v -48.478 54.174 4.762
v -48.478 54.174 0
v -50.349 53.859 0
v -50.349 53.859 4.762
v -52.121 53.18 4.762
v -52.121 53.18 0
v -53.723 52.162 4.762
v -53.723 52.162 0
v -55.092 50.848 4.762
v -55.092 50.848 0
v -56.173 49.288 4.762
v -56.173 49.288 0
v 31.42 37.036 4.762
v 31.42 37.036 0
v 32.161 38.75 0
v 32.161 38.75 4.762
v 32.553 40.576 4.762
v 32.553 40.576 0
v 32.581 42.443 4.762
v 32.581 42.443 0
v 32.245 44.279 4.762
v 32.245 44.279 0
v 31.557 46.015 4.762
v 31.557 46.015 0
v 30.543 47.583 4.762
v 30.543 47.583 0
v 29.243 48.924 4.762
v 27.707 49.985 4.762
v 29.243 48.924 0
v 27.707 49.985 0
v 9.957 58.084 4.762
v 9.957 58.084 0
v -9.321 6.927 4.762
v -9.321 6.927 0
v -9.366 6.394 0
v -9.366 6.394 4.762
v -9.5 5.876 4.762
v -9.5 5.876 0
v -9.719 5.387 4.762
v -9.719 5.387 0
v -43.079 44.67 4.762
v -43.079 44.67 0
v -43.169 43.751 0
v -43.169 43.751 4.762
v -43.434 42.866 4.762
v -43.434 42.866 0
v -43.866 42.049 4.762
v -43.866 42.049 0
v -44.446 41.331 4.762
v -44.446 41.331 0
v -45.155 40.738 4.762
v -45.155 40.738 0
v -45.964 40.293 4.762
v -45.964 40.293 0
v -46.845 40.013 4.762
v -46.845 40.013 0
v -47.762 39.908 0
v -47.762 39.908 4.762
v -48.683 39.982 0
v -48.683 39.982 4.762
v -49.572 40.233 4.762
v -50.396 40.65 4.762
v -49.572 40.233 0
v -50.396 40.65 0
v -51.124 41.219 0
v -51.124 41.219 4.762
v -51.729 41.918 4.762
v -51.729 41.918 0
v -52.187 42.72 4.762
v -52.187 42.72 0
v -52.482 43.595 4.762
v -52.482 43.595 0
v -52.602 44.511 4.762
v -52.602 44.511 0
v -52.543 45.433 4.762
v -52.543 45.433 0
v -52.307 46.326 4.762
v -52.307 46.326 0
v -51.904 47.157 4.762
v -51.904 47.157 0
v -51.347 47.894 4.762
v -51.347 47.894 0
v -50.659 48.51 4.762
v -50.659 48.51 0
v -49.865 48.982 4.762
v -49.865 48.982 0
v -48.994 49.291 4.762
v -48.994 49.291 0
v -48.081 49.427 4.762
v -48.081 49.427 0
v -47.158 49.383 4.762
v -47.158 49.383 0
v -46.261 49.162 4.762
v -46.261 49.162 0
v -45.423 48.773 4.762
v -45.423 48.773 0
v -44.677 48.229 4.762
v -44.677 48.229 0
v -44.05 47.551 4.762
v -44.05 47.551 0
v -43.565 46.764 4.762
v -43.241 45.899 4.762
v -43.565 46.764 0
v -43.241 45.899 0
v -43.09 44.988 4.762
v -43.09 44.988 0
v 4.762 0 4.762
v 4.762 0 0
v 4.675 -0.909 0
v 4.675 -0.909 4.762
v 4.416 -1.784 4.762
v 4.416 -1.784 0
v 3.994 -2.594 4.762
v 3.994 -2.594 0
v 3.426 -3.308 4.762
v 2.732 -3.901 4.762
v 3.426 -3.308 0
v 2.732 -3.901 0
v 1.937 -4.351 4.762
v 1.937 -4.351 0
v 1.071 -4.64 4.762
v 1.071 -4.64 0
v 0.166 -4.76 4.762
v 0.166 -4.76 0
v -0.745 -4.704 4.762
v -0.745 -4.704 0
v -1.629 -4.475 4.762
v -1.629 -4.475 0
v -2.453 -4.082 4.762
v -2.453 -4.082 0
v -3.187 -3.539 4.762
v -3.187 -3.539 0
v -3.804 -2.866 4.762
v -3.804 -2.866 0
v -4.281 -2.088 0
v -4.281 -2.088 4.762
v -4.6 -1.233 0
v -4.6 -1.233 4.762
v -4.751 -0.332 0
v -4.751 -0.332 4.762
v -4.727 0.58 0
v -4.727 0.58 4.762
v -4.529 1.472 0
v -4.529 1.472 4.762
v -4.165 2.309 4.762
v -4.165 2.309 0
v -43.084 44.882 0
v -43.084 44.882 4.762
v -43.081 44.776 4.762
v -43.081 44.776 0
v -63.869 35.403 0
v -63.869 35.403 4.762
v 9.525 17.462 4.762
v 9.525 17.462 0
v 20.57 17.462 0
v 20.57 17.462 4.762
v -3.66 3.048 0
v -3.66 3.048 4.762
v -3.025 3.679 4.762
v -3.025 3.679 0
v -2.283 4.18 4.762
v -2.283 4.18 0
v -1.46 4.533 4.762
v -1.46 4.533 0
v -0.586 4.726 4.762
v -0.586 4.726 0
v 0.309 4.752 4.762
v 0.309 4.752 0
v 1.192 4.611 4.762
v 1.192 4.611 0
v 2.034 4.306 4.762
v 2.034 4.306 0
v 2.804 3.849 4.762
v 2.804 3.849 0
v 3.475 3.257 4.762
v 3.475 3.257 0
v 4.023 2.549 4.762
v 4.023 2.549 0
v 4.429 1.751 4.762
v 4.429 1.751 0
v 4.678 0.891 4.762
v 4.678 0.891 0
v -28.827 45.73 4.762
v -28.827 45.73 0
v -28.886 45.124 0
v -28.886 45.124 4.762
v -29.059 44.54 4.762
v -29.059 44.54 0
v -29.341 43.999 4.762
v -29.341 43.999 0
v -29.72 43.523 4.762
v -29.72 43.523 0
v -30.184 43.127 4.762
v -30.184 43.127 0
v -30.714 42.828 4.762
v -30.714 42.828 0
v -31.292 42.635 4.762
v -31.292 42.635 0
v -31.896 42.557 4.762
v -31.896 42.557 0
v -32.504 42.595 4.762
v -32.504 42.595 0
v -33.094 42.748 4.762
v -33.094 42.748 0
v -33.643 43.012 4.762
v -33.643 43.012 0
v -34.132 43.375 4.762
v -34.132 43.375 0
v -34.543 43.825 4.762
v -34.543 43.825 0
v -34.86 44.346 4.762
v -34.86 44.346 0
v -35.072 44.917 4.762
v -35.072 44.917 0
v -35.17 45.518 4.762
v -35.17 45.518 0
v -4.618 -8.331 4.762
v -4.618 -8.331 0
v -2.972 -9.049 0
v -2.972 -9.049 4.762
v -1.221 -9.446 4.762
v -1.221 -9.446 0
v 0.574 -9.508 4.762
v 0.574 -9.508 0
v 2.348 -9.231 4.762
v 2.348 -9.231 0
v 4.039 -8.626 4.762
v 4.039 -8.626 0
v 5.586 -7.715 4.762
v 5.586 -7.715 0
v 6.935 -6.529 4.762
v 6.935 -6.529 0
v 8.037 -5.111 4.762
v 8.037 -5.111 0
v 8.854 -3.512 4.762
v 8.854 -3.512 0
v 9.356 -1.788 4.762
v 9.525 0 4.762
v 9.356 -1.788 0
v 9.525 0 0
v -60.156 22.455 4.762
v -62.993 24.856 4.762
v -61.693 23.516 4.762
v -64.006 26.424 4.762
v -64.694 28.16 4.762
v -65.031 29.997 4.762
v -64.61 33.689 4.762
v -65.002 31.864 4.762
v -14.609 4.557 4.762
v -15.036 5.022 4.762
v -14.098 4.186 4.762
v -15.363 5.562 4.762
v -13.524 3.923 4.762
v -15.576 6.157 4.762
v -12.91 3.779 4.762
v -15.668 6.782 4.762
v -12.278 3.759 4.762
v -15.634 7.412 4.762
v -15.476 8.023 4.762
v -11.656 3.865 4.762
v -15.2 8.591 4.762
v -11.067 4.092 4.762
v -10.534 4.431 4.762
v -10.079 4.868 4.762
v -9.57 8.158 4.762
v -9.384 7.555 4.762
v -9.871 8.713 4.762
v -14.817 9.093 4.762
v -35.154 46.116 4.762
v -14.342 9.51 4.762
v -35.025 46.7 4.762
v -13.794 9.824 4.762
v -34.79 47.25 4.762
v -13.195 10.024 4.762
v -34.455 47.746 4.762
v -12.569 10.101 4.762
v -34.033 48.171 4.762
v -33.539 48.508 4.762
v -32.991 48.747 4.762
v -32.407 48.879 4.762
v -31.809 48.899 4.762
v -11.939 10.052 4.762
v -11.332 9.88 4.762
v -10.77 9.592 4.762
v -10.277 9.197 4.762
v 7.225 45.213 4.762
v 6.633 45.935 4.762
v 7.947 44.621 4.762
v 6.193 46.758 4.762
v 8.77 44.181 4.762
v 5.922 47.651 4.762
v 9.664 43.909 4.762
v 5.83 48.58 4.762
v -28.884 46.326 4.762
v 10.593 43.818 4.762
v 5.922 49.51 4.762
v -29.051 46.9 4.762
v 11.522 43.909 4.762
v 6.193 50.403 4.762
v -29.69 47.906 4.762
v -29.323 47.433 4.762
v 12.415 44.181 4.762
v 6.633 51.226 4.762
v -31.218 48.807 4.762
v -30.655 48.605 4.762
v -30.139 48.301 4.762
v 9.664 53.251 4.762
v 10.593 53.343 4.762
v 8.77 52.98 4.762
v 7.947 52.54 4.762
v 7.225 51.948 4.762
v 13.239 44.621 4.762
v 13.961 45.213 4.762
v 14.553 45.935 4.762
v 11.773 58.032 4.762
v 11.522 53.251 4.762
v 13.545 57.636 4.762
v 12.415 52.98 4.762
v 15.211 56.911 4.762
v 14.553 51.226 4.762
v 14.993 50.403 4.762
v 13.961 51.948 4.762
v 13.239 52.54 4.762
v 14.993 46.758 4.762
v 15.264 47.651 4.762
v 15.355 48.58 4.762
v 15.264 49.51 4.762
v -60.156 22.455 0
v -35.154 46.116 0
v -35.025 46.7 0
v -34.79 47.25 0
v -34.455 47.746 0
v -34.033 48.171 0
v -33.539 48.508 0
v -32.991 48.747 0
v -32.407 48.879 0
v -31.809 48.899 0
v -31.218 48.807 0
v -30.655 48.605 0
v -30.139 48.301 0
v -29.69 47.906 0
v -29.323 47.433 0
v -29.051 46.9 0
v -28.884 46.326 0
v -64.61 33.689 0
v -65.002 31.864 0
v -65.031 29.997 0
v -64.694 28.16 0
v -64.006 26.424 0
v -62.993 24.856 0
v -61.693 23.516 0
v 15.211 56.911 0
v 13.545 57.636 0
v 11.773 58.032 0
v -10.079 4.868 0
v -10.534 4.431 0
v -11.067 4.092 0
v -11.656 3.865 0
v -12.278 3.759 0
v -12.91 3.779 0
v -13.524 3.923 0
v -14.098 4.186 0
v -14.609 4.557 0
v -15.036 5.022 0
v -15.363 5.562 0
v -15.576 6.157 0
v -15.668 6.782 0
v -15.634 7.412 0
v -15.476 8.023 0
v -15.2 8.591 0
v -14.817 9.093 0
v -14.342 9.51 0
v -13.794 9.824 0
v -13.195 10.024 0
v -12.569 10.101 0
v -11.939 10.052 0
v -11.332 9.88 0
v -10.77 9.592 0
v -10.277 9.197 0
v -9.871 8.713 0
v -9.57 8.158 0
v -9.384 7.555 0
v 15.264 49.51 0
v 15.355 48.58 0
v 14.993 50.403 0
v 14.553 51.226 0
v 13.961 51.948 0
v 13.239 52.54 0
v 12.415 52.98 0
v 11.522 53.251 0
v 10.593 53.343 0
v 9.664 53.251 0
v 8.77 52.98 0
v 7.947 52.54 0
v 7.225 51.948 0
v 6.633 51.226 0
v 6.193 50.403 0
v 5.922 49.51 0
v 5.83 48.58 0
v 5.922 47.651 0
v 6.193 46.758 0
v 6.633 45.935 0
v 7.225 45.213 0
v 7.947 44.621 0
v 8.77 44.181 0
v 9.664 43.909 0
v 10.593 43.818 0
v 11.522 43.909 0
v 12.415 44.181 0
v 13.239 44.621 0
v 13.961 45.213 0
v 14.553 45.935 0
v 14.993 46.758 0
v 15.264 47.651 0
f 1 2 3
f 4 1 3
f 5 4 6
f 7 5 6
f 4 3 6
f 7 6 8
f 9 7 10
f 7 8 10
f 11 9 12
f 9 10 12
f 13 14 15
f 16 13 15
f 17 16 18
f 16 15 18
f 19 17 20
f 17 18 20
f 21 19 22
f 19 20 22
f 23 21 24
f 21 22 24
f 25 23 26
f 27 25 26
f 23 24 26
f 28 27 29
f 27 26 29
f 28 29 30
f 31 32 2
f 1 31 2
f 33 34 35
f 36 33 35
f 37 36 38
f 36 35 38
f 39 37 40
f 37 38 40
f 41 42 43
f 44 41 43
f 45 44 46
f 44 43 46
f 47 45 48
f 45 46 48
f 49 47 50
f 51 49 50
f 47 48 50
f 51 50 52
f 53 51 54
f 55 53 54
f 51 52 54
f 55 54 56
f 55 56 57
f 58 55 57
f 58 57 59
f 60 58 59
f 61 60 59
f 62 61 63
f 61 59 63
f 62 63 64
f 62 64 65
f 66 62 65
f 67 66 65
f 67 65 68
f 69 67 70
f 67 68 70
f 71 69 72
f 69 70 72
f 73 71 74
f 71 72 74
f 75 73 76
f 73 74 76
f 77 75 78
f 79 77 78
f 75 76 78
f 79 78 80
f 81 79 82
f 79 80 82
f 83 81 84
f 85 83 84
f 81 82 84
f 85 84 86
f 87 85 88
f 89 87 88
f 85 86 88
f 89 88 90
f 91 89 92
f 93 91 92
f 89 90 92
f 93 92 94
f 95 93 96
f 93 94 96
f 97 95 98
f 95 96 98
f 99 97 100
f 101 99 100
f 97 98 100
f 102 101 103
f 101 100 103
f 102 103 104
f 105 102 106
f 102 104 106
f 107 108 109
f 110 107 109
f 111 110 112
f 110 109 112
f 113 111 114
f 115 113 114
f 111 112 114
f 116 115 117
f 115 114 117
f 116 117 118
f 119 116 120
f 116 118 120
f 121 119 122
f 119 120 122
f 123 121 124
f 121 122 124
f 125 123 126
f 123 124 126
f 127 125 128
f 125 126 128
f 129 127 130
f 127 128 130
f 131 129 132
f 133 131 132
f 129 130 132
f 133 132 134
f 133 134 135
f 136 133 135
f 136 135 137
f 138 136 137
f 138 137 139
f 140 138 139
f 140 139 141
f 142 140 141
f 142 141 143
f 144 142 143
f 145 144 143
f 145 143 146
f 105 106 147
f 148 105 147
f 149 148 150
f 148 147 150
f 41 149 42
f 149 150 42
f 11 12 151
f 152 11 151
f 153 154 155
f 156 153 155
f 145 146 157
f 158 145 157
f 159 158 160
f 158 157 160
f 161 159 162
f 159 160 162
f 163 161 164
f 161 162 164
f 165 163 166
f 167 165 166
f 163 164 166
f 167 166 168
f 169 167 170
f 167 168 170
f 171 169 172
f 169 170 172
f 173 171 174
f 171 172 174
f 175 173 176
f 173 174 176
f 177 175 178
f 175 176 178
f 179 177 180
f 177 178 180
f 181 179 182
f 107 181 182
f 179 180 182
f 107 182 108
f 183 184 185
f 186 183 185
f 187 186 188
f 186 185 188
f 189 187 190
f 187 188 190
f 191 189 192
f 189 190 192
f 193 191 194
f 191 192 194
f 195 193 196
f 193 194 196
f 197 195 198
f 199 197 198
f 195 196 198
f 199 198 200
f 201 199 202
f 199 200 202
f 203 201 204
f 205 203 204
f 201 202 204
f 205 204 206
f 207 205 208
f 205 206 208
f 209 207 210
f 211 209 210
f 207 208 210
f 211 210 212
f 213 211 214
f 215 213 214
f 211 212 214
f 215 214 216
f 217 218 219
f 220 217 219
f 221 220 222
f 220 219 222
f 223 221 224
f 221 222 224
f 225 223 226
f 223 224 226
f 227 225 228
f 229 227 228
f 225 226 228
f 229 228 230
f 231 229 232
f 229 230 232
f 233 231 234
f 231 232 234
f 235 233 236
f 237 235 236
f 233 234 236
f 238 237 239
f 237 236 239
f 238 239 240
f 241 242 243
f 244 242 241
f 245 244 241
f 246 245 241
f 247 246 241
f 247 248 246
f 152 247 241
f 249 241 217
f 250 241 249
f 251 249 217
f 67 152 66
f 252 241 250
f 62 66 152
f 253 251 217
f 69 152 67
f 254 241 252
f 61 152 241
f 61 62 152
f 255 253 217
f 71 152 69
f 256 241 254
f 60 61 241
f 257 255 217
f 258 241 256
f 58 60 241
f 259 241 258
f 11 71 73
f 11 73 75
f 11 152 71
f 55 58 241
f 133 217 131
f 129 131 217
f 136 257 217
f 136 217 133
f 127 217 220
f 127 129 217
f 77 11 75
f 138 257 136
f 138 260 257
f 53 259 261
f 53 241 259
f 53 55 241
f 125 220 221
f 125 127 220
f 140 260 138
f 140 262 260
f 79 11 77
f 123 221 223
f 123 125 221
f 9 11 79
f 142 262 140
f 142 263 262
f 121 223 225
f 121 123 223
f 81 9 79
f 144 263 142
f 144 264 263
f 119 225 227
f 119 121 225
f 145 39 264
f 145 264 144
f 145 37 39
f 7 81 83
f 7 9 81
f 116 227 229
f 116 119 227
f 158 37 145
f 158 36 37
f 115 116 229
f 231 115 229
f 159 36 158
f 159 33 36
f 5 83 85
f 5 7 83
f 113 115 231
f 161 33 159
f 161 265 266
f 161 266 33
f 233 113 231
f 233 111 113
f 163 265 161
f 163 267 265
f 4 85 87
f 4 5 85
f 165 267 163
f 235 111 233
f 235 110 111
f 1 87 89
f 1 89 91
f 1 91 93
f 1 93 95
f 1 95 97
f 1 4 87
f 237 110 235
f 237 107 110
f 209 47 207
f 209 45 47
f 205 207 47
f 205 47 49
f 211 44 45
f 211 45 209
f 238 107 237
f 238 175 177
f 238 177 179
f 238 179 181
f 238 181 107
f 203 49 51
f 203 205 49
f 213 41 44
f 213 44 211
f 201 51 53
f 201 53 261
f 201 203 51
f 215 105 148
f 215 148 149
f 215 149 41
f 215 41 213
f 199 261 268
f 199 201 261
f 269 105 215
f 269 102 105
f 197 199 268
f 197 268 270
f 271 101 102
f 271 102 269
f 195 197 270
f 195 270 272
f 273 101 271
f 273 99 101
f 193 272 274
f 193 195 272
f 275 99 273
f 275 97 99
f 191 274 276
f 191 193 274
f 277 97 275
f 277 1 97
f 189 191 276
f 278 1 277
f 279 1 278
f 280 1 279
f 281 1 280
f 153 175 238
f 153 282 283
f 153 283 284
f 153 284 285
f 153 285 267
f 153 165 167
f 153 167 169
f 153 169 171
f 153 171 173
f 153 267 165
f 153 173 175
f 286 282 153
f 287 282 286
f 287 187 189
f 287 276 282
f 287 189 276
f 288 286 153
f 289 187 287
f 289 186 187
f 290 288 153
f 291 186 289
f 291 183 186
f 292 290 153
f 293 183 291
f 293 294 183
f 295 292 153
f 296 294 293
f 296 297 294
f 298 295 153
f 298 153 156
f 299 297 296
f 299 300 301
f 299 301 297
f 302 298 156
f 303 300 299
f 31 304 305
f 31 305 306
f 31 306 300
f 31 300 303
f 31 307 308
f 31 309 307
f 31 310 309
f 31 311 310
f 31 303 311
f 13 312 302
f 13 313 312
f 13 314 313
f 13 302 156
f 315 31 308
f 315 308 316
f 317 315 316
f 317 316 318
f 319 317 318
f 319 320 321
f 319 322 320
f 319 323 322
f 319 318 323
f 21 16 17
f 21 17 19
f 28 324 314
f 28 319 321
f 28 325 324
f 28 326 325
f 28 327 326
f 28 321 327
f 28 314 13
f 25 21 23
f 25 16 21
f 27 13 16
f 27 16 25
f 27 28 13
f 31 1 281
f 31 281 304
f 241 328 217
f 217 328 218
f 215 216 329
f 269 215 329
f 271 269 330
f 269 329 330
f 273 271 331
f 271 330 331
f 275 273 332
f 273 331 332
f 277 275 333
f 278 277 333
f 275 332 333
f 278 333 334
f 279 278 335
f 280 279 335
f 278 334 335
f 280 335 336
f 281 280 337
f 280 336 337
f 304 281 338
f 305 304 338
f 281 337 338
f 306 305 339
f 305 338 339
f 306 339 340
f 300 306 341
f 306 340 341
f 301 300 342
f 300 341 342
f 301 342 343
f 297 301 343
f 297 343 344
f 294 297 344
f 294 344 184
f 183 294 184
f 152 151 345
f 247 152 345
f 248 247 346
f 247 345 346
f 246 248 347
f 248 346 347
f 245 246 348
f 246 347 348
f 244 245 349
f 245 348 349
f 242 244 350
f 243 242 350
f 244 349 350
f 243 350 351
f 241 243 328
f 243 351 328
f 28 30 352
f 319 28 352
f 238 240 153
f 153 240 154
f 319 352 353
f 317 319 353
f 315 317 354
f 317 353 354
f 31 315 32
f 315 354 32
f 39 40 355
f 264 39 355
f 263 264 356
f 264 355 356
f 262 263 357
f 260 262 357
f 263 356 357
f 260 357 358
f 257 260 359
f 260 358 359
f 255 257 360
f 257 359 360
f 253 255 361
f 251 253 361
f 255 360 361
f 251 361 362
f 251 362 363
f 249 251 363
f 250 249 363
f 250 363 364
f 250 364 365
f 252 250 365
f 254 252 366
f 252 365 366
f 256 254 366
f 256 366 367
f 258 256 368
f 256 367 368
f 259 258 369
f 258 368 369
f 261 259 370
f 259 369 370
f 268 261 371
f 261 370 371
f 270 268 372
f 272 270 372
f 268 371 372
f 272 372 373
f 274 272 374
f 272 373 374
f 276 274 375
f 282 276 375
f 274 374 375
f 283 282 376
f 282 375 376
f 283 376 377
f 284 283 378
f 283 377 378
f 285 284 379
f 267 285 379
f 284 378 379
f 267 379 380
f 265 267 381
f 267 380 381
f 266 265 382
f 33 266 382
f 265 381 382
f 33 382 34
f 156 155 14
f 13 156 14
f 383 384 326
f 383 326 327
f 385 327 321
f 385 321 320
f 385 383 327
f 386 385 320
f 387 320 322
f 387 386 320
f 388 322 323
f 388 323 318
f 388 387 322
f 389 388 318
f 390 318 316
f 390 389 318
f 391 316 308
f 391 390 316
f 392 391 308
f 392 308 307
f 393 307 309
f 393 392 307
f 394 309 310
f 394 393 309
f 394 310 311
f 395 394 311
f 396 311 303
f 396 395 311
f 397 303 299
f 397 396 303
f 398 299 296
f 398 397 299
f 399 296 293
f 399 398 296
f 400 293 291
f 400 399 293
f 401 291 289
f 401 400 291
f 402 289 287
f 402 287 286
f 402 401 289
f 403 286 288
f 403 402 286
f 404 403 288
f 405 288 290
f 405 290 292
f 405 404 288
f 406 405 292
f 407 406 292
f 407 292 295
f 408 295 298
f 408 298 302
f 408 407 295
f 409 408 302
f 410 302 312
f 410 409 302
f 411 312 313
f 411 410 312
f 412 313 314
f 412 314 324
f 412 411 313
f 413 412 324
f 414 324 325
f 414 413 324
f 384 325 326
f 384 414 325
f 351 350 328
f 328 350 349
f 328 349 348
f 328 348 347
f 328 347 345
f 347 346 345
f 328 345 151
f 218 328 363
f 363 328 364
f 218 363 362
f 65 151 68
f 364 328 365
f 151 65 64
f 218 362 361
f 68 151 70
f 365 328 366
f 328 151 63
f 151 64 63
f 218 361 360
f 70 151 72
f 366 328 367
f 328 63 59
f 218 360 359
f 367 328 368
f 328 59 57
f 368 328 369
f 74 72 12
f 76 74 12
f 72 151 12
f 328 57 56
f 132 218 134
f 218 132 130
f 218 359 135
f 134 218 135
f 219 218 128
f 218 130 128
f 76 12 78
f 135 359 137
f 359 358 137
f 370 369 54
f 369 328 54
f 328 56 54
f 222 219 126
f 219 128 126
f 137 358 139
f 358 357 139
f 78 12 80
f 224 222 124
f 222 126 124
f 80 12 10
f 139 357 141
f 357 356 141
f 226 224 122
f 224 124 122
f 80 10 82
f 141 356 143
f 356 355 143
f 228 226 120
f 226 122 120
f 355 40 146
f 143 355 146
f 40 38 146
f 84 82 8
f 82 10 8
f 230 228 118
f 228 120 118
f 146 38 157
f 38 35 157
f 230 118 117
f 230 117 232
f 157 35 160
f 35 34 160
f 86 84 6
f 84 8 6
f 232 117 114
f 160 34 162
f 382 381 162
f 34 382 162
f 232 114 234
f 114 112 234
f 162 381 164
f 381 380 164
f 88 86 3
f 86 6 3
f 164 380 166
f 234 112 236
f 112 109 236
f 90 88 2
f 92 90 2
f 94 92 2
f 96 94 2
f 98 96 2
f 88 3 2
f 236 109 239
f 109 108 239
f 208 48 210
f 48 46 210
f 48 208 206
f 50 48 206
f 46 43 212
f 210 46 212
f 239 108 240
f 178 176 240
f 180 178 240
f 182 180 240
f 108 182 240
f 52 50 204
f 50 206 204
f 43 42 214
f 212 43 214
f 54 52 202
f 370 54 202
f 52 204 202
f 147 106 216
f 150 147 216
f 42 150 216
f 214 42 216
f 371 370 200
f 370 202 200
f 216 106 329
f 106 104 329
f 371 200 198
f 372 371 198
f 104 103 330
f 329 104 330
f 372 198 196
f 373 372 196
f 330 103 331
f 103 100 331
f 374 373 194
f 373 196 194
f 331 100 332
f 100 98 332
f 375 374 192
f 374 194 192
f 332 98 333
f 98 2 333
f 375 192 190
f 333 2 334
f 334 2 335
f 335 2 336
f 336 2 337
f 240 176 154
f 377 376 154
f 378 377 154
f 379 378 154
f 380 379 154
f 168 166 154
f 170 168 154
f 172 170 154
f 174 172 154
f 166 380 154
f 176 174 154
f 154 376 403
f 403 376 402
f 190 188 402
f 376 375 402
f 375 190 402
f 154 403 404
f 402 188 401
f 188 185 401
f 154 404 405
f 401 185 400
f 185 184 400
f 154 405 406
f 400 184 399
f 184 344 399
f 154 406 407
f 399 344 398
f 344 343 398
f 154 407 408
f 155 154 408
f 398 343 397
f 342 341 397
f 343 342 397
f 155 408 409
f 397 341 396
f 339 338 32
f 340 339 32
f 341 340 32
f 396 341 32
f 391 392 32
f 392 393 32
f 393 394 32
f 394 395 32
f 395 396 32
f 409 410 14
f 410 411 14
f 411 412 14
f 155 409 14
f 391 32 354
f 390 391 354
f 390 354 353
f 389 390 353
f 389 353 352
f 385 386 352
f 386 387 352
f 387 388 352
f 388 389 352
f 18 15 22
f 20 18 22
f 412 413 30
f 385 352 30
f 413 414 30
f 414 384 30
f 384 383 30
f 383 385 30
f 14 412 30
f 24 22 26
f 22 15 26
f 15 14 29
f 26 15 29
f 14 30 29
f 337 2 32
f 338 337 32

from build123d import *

# Parameters (mm, degrees)
F0_R     = 4.7625
F1_DEPTH = 4.7625


# Not quite as in the source:
# - a length typed as a fraction of an inch, garbled in the dataset ("3 / 203.2 mm" for 3/8 in), is restored


with BuildPart() as f1:
    # F0 (on Top) → F1 (new body)
    with BuildSketch(Plane.XY):
        with BuildLine():
            Line((-60.1561630362, 22.4546581751), (-4.6178116328, -8.3307527105))
            ThreePointArc((-4.6178116328, -8.3307527105), (4.8343029072, -8.2070177532), (9.525, 0))
            Line((9.525, 0), (9.525, 17.4625))
            Line((9.525, 17.4625), (20.5700693075, 17.4625))
            Line((20.5700693075, 17.4625), (31.4198108747, 37.0359519197))
            ThreePointArc((31.4198108747, 37.0359519197), (32.245075818, 44.2792093667), (27.7068697971, 49.984516263))
            Line((27.7068697971, 49.984516263), (15.2107407313, 56.9112337123))
            ThreePointArc((15.2107407313, 56.9112337123), (12.6684281132, 57.8766054007), (9.9569358455, 58.0842243475))
            Line((9.9569358455, 58.0842243475), (-48.4779919349, 54.1737420822))
            ThreePointArc((-48.4779919349, 54.1737420822), (-52.9477518555, 52.7109507654), (-56.1727513924, 49.2878103693))
            Line((-56.1727513924, 49.2878103693), (-63.8691041139, 35.4032225185))
            ThreePointArc((-63.8691041139, 35.4032225185), (-64.6943690572, 28.1599650715), (-60.1561630362, 22.4546581751))
        make_face()
        with BuildLine():
            ThreePointArc((-9.3211290658, 6.9267174493), (-9.4222603076, 6.1317609364), (-9.7192114956, 5.387446905))
            ThreePointArc((-9.7192114956, 5.387446905), (-15.569997824, 7.7216739621), (-9.3211290658, 6.9267174493))
        make_face(mode=Mode.SUBTRACT)
        with BuildLine():
            ThreePointArc((4.7625, 0), (-1.1924347693, -4.6108031373), (-4.1653763553, 2.3089058164))
            ThreePointArc((-4.1653763553, 2.3089058164), (1.1924347693, 4.6108031373), (4.7625, 0))
        make_face(mode=Mode.SUBTRACT)
        with BuildLine():
            ThreePointArc((-43.0794986819, 44.6699987365), (-52.6018408585, 44.510911641), (-43.0901270091, 44.987995363))
            ThreePointArc((-43.0901270091, 44.987995363), (-43.0821565054, 44.829085832), (-43.0794986819, 44.6699987365))
        make_face(mode=Mode.SUBTRACT)
        with BuildLine():
            ThreePointArc((-28.827426439, 45.7299874915), (-31.8963683753, 42.5567593737), (-35.1703408876, 45.5179897405))
            ThreePointArc((-35.1703408876, 45.5179897405), (-32.1084845027, 48.9032156092), (-28.827426439, 45.7299874915))
        make_face(mode=Mode.SUBTRACT)
        with Locations((10.5929290985, 48.5804810018)):
            Circle(F0_R, mode=Mode.SUBTRACT)
    extrude(amount=F1_DEPTH)


solid = f1.part
